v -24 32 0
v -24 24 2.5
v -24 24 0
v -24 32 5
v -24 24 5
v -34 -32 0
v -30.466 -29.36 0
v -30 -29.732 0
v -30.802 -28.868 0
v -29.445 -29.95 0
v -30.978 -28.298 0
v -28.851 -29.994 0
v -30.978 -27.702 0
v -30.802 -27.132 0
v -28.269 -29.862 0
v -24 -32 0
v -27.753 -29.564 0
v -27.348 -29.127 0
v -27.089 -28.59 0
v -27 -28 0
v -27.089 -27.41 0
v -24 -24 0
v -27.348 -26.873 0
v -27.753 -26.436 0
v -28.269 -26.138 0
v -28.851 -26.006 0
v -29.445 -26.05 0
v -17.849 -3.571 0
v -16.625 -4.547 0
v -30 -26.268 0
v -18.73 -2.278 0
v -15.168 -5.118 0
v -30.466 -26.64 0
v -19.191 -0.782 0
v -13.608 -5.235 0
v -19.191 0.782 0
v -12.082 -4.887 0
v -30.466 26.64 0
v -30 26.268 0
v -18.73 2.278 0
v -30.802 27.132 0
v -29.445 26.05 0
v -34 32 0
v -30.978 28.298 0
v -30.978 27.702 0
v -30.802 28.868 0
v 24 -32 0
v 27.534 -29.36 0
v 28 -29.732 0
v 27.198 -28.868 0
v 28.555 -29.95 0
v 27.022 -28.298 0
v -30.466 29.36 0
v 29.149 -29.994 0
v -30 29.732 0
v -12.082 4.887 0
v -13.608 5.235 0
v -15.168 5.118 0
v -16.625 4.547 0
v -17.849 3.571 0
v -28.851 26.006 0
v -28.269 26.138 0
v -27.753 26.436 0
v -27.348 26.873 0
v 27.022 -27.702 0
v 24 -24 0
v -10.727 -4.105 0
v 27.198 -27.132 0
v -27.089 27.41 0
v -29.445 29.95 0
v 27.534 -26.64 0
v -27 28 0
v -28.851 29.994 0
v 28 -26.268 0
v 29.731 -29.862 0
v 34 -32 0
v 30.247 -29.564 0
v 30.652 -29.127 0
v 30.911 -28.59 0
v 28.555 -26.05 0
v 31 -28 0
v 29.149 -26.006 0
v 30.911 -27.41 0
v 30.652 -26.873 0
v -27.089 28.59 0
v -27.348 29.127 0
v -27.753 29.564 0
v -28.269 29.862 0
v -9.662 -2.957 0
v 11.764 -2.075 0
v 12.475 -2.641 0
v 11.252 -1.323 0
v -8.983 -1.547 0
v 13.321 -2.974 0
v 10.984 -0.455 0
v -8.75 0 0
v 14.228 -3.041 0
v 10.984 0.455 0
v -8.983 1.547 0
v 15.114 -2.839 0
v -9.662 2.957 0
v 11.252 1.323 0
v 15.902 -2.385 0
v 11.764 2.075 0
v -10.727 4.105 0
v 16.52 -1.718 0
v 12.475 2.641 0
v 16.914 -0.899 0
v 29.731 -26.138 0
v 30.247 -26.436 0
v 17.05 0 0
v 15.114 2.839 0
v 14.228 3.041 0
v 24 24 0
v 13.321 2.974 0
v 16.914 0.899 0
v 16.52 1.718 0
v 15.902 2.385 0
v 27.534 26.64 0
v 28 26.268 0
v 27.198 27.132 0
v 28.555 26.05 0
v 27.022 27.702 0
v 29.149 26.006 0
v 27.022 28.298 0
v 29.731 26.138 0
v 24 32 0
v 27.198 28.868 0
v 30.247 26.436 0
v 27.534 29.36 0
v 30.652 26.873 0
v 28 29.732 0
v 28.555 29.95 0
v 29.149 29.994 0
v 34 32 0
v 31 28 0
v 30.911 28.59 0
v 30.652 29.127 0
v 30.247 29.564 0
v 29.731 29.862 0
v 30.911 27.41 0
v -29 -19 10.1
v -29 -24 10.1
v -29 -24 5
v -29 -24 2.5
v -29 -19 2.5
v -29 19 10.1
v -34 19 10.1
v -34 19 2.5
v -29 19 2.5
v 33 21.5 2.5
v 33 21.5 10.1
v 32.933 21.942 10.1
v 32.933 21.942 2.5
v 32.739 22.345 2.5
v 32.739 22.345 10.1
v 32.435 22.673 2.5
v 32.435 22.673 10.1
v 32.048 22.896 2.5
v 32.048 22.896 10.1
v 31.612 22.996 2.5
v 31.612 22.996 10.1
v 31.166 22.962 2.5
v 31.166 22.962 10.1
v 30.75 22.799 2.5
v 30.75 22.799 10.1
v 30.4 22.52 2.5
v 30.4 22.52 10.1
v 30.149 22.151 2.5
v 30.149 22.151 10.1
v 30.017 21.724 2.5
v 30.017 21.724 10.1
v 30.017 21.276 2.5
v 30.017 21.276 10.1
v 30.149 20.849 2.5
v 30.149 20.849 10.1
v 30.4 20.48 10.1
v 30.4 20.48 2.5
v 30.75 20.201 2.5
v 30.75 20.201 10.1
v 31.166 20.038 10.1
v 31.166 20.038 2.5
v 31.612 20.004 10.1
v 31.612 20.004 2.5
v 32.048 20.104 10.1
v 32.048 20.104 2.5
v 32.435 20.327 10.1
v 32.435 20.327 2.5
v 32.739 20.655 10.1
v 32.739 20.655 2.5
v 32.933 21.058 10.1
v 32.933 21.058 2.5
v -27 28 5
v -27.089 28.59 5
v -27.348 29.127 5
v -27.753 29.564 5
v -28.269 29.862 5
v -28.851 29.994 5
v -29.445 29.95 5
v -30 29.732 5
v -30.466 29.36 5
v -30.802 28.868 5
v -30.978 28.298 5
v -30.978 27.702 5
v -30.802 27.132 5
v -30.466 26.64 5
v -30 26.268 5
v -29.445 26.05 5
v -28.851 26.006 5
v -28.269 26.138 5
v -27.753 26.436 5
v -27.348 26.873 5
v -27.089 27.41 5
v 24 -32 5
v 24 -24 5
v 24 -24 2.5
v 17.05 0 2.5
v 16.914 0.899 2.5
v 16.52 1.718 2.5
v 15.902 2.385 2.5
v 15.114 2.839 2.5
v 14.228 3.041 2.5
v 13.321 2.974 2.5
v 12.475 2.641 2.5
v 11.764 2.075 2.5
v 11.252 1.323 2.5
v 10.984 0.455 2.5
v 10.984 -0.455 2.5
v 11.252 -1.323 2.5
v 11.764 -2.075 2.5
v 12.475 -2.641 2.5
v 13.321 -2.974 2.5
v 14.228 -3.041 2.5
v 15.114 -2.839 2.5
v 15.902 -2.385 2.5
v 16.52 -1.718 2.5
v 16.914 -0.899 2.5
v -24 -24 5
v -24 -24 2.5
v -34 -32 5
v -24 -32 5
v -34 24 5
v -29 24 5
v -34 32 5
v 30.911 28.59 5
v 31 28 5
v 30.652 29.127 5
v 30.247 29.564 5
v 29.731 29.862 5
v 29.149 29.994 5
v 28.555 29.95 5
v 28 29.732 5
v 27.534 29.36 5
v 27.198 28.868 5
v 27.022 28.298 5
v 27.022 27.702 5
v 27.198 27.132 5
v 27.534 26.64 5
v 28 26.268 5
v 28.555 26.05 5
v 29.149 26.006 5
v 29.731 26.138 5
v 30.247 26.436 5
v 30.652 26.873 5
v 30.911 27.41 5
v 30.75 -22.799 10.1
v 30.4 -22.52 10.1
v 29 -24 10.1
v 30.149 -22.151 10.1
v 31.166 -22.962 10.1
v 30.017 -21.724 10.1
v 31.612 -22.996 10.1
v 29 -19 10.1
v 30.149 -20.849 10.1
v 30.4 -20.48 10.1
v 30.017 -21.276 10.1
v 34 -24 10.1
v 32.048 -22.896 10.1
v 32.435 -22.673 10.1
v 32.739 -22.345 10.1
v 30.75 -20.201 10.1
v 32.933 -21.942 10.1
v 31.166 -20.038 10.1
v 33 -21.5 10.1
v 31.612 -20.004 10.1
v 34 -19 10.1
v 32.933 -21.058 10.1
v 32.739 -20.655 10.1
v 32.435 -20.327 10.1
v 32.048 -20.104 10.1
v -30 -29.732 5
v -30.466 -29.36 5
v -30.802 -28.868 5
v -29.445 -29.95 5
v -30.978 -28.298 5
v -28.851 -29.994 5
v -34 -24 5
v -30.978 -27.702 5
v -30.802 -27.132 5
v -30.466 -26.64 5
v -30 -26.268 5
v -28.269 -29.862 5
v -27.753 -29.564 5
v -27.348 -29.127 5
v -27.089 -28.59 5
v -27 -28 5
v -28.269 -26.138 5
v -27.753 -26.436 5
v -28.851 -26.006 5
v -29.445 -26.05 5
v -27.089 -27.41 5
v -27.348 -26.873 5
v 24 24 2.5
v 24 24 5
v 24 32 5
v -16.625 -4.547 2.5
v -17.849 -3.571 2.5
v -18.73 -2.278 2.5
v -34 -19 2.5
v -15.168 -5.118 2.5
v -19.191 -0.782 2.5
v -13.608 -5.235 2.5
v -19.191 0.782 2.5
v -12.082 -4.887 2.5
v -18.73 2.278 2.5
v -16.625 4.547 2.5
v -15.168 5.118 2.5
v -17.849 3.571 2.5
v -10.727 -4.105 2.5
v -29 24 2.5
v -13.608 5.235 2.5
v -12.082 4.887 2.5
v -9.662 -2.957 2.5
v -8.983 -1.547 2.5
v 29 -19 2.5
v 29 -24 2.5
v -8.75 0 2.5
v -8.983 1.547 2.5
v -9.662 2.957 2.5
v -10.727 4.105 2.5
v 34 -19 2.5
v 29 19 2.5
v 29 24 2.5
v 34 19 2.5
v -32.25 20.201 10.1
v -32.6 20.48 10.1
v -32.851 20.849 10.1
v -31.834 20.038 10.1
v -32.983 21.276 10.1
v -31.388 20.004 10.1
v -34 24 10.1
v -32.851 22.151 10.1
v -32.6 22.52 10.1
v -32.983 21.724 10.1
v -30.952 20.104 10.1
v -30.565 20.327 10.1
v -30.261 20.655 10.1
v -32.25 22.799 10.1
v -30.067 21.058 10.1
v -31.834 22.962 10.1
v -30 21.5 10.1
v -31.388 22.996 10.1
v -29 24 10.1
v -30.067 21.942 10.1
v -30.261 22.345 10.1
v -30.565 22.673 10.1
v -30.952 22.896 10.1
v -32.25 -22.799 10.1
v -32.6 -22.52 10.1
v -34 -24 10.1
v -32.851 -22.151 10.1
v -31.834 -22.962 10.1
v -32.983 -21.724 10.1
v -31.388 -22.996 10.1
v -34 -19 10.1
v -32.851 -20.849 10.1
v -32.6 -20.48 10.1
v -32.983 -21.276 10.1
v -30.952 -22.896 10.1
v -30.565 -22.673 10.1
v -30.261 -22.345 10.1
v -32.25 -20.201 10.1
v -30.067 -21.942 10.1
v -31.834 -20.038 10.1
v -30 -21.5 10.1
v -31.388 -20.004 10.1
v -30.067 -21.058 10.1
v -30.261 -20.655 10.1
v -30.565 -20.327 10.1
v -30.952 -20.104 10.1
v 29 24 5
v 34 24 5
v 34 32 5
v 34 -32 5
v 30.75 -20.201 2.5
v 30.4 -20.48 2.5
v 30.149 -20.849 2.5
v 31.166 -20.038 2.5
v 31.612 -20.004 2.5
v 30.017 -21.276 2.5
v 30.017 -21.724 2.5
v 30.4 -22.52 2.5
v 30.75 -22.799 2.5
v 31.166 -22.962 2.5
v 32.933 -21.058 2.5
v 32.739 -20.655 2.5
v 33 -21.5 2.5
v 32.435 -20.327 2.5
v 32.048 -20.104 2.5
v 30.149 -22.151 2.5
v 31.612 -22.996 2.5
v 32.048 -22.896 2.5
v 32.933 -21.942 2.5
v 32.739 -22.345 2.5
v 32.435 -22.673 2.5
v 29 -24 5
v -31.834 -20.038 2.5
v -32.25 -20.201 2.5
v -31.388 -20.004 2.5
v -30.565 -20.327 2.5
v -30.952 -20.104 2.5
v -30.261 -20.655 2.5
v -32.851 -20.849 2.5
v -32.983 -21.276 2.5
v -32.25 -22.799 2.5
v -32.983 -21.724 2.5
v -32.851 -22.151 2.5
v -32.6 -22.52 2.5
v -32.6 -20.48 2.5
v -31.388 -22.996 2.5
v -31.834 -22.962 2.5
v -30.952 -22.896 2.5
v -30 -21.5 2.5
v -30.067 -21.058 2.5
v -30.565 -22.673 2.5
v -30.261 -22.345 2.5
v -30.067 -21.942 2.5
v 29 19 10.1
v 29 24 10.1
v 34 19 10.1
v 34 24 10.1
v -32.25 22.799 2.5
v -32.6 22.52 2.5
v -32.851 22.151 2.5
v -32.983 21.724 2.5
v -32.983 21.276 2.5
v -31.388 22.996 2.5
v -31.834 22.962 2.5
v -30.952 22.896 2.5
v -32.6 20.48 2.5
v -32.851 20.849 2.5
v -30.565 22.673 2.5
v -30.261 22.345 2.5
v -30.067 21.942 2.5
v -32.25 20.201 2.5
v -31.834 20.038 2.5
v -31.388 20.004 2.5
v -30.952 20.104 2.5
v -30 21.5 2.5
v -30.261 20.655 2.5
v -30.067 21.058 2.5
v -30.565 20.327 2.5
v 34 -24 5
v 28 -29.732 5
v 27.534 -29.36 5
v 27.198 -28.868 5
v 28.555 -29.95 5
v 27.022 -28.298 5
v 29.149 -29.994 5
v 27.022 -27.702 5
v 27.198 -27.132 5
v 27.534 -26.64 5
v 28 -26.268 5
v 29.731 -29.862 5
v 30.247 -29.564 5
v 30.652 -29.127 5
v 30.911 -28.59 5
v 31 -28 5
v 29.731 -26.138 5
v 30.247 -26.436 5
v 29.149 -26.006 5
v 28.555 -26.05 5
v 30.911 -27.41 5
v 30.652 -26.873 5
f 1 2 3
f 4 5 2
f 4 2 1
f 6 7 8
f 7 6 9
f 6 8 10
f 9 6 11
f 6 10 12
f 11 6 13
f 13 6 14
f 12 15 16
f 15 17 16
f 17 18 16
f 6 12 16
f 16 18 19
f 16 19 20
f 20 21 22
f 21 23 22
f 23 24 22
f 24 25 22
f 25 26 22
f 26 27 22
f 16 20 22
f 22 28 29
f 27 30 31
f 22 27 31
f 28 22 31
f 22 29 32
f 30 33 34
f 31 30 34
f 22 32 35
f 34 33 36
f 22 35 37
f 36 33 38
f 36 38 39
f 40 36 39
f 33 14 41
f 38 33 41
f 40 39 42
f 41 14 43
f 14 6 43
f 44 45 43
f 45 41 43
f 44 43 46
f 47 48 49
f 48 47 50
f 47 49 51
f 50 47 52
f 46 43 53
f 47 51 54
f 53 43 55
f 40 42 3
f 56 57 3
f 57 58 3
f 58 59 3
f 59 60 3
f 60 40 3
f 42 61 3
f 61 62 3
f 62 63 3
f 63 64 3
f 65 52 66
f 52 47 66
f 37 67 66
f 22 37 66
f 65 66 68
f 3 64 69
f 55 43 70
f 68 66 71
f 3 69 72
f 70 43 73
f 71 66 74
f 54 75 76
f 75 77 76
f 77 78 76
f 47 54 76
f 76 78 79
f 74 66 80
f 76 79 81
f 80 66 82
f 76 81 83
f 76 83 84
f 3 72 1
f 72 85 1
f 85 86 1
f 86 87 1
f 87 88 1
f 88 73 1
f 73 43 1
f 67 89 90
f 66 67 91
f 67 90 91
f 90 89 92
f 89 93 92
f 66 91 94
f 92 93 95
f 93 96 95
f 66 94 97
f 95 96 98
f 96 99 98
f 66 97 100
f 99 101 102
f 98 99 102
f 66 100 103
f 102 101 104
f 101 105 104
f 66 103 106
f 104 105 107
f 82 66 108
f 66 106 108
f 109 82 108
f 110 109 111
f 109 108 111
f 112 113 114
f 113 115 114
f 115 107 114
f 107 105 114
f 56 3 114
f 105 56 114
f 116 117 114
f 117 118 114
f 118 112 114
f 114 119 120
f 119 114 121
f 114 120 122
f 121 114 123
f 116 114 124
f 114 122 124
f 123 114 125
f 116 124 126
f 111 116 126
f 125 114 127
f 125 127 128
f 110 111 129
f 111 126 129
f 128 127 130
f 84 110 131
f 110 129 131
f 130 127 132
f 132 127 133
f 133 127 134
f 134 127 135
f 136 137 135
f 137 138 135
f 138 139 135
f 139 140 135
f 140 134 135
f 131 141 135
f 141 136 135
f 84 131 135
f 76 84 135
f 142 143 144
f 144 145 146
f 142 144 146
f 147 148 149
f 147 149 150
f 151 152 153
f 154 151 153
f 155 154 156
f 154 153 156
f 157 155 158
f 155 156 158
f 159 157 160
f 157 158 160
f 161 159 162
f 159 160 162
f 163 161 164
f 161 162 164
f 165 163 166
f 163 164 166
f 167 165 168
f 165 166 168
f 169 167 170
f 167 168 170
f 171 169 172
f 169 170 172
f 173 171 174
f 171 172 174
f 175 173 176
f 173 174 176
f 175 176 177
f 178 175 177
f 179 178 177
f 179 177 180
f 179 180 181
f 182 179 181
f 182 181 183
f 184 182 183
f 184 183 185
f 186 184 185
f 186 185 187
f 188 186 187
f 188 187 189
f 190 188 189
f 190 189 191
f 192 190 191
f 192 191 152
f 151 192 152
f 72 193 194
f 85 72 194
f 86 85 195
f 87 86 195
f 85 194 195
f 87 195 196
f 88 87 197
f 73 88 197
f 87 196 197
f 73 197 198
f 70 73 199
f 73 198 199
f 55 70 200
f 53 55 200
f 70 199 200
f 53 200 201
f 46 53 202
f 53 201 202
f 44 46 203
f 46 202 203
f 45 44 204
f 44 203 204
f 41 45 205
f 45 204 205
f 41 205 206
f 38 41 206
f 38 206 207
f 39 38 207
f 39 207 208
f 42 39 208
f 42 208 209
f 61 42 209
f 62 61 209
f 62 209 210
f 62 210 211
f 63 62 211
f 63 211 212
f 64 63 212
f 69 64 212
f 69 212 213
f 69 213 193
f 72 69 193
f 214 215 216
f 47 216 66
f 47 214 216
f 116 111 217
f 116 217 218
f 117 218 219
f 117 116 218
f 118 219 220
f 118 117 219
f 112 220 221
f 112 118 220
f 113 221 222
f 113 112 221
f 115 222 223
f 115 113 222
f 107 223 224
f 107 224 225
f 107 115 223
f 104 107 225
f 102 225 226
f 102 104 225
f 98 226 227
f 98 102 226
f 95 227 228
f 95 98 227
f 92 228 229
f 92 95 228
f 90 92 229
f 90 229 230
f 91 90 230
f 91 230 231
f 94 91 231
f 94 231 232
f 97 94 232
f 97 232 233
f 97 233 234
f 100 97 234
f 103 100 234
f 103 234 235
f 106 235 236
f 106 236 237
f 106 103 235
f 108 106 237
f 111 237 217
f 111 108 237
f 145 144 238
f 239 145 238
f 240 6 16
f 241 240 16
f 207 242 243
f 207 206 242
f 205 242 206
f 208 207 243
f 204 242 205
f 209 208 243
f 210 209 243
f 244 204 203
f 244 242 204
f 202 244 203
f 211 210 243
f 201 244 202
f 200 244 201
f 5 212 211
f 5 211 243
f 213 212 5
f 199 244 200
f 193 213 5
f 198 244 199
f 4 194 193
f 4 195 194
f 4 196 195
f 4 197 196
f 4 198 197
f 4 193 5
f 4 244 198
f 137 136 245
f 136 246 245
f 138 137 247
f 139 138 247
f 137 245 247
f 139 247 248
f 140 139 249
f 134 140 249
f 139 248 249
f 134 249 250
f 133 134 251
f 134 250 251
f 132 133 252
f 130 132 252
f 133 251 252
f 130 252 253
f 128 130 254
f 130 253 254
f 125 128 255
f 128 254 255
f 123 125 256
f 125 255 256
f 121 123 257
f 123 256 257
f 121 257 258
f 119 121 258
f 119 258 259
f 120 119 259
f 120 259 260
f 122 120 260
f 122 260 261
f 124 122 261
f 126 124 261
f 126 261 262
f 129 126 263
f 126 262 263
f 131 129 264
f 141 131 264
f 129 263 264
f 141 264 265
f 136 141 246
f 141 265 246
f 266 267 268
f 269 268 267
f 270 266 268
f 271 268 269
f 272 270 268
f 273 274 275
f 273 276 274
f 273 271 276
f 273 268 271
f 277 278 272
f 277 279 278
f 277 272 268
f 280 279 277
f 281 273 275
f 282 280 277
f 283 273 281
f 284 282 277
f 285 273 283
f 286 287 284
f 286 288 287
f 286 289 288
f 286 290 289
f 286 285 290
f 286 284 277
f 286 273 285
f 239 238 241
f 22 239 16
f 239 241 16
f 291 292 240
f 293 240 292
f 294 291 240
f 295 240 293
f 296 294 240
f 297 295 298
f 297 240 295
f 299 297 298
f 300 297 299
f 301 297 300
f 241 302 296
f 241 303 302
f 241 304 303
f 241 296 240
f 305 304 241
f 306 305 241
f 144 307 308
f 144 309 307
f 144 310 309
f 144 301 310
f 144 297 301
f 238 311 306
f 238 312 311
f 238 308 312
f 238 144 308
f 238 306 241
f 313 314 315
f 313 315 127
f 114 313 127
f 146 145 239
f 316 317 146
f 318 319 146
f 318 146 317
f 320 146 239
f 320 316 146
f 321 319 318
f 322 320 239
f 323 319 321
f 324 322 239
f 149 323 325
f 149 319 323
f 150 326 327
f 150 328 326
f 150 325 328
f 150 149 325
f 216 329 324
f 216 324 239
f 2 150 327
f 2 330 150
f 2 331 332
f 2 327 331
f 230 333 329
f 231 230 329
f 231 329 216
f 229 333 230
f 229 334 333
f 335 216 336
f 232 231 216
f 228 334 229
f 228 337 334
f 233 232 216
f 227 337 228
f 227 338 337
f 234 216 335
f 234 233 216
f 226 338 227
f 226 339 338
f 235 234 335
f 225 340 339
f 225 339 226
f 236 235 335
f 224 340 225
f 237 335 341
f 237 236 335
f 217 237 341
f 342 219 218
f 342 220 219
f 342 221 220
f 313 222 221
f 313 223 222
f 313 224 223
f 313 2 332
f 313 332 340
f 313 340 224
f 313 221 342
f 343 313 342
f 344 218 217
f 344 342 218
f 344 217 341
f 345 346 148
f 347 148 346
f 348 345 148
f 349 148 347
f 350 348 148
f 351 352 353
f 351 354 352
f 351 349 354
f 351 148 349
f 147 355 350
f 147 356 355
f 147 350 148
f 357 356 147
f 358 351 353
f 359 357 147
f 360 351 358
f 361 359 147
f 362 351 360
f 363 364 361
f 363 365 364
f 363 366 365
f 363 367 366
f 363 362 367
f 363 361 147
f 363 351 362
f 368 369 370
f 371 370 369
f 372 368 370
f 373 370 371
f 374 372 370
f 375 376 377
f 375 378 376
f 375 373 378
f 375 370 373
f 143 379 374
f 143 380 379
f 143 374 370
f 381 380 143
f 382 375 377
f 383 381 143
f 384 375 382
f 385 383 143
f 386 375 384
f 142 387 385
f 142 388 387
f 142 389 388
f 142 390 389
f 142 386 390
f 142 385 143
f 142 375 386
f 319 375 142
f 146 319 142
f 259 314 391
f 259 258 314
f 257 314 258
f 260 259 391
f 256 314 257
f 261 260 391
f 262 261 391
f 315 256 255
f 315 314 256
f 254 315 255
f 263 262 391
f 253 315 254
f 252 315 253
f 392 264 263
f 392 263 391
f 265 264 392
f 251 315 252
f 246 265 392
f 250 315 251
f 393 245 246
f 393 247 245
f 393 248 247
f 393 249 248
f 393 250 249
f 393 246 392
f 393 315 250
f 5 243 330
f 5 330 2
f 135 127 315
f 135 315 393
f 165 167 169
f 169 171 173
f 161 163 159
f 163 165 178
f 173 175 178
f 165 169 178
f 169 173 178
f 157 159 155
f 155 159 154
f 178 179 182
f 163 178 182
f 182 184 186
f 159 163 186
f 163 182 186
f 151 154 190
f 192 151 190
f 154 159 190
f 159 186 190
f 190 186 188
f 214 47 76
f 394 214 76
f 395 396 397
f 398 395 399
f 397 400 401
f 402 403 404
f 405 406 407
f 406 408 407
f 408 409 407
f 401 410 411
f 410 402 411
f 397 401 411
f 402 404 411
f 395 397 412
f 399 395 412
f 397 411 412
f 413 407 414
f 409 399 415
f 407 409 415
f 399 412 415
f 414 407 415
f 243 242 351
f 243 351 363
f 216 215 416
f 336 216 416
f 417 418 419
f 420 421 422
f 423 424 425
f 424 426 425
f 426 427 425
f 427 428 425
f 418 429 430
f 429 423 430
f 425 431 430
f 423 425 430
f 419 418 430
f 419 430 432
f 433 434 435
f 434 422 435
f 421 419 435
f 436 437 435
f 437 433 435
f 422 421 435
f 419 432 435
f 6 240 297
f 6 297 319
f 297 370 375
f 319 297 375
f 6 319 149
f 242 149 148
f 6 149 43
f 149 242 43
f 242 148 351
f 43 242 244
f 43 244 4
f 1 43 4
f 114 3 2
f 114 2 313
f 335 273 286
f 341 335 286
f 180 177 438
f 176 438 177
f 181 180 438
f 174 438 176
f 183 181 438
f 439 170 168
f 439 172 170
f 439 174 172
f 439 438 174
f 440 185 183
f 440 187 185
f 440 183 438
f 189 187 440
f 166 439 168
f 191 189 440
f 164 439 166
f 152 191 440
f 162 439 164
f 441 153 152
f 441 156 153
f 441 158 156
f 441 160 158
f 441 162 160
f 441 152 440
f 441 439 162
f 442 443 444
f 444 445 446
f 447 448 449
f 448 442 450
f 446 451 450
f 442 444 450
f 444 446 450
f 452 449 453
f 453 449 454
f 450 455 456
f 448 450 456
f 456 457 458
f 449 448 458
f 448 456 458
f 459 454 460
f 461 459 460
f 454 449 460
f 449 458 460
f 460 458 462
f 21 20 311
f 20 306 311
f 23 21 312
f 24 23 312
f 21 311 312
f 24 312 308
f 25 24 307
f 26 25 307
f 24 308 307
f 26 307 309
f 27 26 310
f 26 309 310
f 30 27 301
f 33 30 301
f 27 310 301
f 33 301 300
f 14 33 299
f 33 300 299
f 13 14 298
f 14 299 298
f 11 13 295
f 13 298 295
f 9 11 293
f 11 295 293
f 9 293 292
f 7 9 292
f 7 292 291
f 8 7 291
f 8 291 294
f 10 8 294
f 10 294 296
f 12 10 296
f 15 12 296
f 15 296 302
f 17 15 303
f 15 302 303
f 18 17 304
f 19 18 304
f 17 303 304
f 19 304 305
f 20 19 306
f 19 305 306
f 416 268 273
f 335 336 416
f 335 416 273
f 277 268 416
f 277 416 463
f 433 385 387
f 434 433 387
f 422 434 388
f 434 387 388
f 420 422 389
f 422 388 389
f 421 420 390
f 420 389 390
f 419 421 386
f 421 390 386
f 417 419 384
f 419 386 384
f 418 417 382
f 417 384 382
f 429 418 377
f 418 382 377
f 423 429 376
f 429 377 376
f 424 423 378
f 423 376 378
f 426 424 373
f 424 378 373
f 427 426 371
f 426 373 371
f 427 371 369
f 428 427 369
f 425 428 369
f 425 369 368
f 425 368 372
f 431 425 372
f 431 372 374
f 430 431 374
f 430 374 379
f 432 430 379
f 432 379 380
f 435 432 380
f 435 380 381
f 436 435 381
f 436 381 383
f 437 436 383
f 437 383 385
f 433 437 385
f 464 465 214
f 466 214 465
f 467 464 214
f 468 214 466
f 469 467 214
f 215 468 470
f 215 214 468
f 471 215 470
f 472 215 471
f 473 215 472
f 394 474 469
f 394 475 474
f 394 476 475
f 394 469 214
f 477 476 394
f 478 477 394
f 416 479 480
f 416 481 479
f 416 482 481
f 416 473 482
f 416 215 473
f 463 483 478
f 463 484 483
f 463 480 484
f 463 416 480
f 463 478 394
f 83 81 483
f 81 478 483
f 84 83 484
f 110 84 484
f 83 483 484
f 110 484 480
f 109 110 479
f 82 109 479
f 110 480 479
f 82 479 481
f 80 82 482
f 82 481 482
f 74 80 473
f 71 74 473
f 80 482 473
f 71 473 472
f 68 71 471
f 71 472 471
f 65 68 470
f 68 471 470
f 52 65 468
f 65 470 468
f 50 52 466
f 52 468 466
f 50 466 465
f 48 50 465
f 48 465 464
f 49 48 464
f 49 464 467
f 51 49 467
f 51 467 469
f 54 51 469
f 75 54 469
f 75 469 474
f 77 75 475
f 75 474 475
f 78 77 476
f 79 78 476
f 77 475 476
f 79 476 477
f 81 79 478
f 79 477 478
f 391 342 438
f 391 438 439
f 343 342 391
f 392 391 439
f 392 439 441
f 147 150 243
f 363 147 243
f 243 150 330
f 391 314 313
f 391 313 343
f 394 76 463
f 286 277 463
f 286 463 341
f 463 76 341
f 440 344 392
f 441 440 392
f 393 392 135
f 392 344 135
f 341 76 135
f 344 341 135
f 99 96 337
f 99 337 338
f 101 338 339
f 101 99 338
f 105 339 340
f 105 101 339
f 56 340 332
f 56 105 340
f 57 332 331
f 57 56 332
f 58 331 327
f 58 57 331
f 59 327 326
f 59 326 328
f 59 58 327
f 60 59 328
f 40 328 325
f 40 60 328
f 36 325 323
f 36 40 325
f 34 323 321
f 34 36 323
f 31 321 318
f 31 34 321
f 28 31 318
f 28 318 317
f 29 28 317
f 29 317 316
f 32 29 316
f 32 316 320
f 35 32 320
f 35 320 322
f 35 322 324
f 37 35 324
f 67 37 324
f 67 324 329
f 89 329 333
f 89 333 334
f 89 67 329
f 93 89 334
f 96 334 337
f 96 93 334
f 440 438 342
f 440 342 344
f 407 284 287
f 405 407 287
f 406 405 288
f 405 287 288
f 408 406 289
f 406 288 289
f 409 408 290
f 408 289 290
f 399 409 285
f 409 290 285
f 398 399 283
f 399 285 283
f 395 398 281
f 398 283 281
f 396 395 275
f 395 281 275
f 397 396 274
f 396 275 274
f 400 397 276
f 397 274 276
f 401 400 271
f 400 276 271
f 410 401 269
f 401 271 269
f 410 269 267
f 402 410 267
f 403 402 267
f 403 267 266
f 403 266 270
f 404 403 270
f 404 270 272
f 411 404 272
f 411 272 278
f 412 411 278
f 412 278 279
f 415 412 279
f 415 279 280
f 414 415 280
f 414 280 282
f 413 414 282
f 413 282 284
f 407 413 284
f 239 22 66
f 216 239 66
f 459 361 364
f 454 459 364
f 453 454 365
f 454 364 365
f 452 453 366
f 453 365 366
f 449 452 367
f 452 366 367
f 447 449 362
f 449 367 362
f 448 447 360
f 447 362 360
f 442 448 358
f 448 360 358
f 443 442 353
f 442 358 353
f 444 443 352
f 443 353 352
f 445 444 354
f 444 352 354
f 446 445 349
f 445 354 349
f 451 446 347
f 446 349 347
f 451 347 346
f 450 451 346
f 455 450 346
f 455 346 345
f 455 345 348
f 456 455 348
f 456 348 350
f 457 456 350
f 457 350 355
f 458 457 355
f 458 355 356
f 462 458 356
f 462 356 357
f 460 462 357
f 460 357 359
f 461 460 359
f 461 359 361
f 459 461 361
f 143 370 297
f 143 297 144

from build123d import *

# Parameters (mm, degrees)
SKICA1_W                     = 68
SKICA1_H                     = 48
SKICA1_R                     = 5.25
SKICA1_R_2                   = 3.05
P_IDAT_VYSUNUT_M1_DEPTH      = 2.5
SKICA2_W                     = 5
SKICA2_H                     = 5
P_IDAT_VYSUNUT_M2_DEPTH      = 7.6
SKICA3_R                     = 1.5
ODEBRAT_VYSUNUT_M1_DEPTH     = 10.1
SKICA8_R                     = 1.5
ODEBRAT_VYSUNUT_M2_DEPTH     = 10.1
SKICA9_R                     = 1.5
ODEBRAT_VYSUNUT_M3_DEPTH     = 10.1
SKICA10_R                    = 1.5
ODEBRAT_VYSUNUT_M4_DEPTH     = 10.1
P_IDAT_VYSUNUT_M3_DEPTH      = 8
P_IDAT_VYSUNUT_M3_DEPTH_BACK = 56
SKICA11_W                    = 10
SKICA11_H                    = 2.5
SKICA12_R                    = 2
ODEBRAT_VYSUNUT_M5_DEPTH     = 8
P_IDAT_START                 = 2.5
SKICA13_W                    = 10
SKICA13_H                    = 8
SKICA13_R                    = 2
P_IDAT_VYSUNUT_M4_DEPTH      = 2.5


with BuildPart() as part:
    # Skica1 → Přidat vysunutím1 (new body)
    with BuildSketch(Plane.XY):
        Rectangle(SKICA1_W, SKICA1_H)
        with Locations((-14, 0)):
            Circle(SKICA1_R, mode=Mode.SUBTRACT)
        with Locations((14, 0)):
            Circle(SKICA1_R_2, mode=Mode.SUBTRACT)
    extrude(amount=P_IDAT_VYSUNUT_M1_DEPTH)

    # Skica2 → Přidat vysunutím2 (add)
    with BuildSketch(Plane.XY.offset(2.5)):
        with Locations((-31.5, 21.5)):
            Rectangle(SKICA2_W, SKICA2_H)
        with Locations((31.5, 21.5)):
            Rectangle(SKICA2_W, SKICA2_H)
        with Locations((31.5, -21.5)):
            Rectangle(SKICA2_W, SKICA2_H)
        with Locations((-31.5, -21.5)):
            Rectangle(SKICA2_W, SKICA2_H)
    extrude(amount=P_IDAT_VYSUNUT_M2_DEPTH)

    # Skica3 → Odebrat vysunutím1 (cut)
    with BuildSketch(Plane.XY.offset(10.1)):
        with Locations((-31.5, 21.5)):
            Circle(SKICA3_R)
    extrude(amount=-ODEBRAT_VYSUNUT_M1_DEPTH, mode=Mode.SUBTRACT)

    # Skica8 → Odebrat vysunutím2 (cut)
    with BuildSketch(Plane.XY.offset(10.1)):
        with Locations((31.5, 21.5)):
            Circle(SKICA8_R)
    extrude(amount=-ODEBRAT_VYSUNUT_M2_DEPTH, mode=Mode.SUBTRACT)

    # Skica9 → Odebrat vysunutím3 (cut)
    with BuildSketch(Plane.XY.offset(10.1)):
        with Locations((31.5, -21.5)):
            Circle(SKICA9_R)
    extrude(amount=-ODEBRAT_VYSUNUT_M3_DEPTH, mode=Mode.SUBTRACT)

    # Skica10 → Odebrat vysunutím4 (cut)
    with BuildSketch(Plane.XY.offset(10.1)):
        with Locations((-31.5, -21.5)):
            Circle(SKICA10_R)
    extrude(amount=-ODEBRAT_VYSUNUT_M4_DEPTH, mode=Mode.SUBTRACT)

    # Skica11 → Přidat vysunutím3 (add, two sides: drawn at the far end of the back side and taken through both)
    with BuildSketch(Plane(origin=(0, 24, 0), x_dir=(1, 0, 0), z_dir=(0, 1, 0)).offset(-P_IDAT_VYSUNUT_M3_DEPTH_BACK)):
        with Locations((-29, -1.25)):
            Rectangle(SKICA11_W, SKICA11_H)
        with Locations((29, -1.25)):
            Rectangle(SKICA11_W, SKICA11_H)
    extrude(amount=P_IDAT_VYSUNUT_M3_DEPTH + P_IDAT_VYSUNUT_M3_DEPTH_BACK)

    # Skica12 → Odebrat vysunutím5 (cut)
    with BuildSketch(Plane.XY.offset(2.5)):
        with Locations((-29, 28)):
            Circle(SKICA12_R)
        with Locations((29, 28)):
            Circle(SKICA12_R)
        with Locations((29, -28)):
            Circle(SKICA12_R)
        with Locations((-29, -28)):
            Circle(SKICA12_R)
    extrude(amount=-ODEBRAT_VYSUNUT_M5_DEPTH, mode=Mode.SUBTRACT)

    # Skica13 → Přidat vysunutím4 (add)
    # profile 1 of 4: a face of its own
    with BuildSketch(Plane.XY.offset(2.5).offset(P_IDAT_START)):
        with Locations((-29, 28)):
            Rectangle(SKICA13_W, SKICA13_H)
        with Locations((-29, 28)):
            Circle(SKICA13_R, mode=Mode.SUBTRACT)
    # profile 2 of 4: a face of its own
    with BuildSketch(Plane.XY.offset(2.5).offset(P_IDAT_START)):
        with Locations((29, 28)):
            Rectangle(SKICA13_W, SKICA13_H)
        with Locations((29, 28)):
            Circle(SKICA13_R, mode=Mode.SUBTRACT)
    # profile 3 of 4: a face of its own
    with BuildSketch(Plane.XY.offset(2.5).offset(P_IDAT_START)):
        with Locations((29, -28)):
            Rectangle(SKICA13_W, SKICA13_H)
        with Locations((29, -28)):
            Circle(SKICA13_R, mode=Mode.SUBTRACT)
    # profile 4 of 4: a face of its own
    with BuildSketch(Plane.XY.offset(2.5).offset(P_IDAT_START)):
        with Locations((-29, -28)):
            Rectangle(SKICA13_W, SKICA13_H)
        with Locations((-29, -28)):
            Circle(SKICA13_R, mode=Mode.SUBTRACT)
    extrude(amount=-P_IDAT_VYSUNUT_M4_DEPTH)


solid = part.part
